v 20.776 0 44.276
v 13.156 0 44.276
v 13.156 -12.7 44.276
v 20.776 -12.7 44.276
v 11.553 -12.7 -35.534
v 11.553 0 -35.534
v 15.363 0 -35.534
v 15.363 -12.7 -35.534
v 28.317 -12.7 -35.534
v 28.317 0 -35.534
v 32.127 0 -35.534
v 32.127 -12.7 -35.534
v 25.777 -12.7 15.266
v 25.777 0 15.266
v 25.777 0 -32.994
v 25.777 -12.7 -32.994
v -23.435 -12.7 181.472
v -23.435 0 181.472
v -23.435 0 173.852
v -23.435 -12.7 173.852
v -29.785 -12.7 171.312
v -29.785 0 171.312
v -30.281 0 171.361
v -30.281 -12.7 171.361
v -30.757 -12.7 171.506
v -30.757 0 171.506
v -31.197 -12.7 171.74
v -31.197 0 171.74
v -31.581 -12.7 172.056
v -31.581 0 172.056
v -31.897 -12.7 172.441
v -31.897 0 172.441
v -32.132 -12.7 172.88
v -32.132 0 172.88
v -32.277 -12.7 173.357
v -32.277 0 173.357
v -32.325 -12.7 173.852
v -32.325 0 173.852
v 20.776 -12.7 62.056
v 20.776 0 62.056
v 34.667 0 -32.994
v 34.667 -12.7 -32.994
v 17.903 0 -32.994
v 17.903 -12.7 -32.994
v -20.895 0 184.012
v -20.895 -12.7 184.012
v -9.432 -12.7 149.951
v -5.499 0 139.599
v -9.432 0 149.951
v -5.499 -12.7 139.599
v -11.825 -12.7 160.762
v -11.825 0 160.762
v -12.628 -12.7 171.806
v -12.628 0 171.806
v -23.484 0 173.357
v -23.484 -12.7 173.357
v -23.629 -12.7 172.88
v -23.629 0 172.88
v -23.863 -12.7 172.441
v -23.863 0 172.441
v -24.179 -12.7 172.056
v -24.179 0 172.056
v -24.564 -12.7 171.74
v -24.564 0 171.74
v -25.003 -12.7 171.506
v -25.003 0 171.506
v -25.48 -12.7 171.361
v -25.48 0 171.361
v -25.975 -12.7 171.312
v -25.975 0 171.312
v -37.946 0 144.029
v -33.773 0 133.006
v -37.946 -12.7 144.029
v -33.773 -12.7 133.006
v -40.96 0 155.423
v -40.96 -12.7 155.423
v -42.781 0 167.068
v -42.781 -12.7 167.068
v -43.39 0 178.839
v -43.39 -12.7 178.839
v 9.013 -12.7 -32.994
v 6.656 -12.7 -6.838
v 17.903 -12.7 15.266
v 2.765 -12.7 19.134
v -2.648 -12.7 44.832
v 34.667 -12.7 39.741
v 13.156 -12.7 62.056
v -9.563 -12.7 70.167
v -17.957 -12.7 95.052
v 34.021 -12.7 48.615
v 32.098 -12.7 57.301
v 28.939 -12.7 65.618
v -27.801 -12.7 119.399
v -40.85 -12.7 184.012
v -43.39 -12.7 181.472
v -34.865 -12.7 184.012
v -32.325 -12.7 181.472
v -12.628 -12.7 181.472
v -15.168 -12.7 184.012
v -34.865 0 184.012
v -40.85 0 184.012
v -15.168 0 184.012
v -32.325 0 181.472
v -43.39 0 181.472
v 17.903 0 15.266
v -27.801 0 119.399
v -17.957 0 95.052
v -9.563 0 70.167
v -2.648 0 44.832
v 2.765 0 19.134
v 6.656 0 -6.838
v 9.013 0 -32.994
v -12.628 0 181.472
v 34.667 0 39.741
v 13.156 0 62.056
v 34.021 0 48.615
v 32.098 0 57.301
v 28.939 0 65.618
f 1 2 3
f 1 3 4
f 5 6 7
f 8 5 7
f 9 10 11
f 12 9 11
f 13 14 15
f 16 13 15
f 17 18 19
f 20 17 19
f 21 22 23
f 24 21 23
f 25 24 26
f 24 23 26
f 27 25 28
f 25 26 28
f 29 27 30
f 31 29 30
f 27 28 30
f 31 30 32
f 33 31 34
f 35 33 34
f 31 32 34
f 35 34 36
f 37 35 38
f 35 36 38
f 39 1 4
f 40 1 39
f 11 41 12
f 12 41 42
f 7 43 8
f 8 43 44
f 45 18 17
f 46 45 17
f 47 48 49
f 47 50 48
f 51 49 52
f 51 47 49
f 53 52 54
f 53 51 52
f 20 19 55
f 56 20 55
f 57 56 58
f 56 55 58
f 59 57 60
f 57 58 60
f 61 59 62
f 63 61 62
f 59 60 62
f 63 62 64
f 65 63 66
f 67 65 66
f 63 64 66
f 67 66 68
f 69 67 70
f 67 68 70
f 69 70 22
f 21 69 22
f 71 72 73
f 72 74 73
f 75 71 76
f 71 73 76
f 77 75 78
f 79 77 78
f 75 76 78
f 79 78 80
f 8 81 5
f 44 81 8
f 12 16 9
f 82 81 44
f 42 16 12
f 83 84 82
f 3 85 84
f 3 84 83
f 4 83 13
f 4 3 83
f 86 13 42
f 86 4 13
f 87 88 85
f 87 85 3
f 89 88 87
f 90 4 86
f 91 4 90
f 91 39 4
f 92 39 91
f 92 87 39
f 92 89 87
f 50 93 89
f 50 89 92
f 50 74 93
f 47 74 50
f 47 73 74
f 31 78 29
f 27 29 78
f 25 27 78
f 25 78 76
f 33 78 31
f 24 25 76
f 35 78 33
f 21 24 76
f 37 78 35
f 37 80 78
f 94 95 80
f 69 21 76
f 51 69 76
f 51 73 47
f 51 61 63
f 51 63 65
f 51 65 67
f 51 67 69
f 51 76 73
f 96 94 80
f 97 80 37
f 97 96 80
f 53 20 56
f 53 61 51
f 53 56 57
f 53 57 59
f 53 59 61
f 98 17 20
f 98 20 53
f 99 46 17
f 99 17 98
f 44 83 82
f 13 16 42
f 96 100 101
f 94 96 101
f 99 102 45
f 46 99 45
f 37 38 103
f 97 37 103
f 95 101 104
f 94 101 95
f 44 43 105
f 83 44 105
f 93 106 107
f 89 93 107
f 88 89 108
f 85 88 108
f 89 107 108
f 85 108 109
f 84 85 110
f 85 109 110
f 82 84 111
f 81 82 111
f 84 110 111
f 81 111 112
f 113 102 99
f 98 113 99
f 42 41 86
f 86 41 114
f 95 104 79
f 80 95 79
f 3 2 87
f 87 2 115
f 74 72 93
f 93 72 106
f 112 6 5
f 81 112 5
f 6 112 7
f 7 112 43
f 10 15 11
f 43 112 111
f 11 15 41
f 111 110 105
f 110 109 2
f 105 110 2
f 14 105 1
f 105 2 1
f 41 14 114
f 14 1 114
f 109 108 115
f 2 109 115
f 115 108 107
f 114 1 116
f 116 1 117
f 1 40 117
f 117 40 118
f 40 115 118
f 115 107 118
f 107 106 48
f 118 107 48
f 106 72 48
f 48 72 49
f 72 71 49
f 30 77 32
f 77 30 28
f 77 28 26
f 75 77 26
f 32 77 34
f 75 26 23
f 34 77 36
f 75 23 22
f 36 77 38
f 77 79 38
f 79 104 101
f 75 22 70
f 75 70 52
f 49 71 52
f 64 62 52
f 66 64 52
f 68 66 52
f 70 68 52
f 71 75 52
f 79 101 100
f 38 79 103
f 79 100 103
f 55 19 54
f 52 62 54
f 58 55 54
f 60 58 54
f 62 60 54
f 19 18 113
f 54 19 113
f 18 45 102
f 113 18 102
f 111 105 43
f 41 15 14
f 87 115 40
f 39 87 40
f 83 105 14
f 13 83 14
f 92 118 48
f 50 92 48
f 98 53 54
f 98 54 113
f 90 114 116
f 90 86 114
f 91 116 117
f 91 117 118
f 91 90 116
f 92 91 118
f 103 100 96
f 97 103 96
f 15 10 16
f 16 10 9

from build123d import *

# Parameters (mm, degrees)
F0_W        = 7.62
F0_H        = 17.78
F1_DEPTH    = 12.7
F2_SIZE     = 2.54
F3_R        = 61.3177298103
F4_R        = 76.3155057079
F5_R        = 114.0325409017
F6_T1_DEPTH = 12.7


# Not quite as in the source:
# - a fillet or chamfer that OpenCascade refuses, or shapes differently, is made with other operations: its cross-section is extruded or revolved along the edge and cut away or added


with BuildPart() as f1:
    # F0 (on Front) → F1 (new body)
    with BuildSketch(Plane.XZ):
        with BuildLine():
            Line((-43.3897525072, 184.0122990829), (-43.3897525072, 154.9135648233))
            Line((-43.3897525072, 154.9135648233), (-12.6282460988, 154.9135648233))
            Line((-12.6282460988, 154.9135648233), (-12.6282460988, 184.0122990829))
            Line((-12.6282460988, 184.0122990829), (-23.4354074901, 184.0122990829))
            Line((-23.4354074901, 184.0122990829), (-23.4354074901, 173.8522990829))
            ThreePointArc((-23.4354074901, 173.8522990829), (-24.1793562659, 172.0562478587), (-25.9754074901, 171.3122990829))
            Line((-25.9754074901, 171.3122990829), (-29.7854074901, 171.3122990829))
            ThreePointArc((-29.7854074901, 171.3122990829), (-31.5814587143, 172.0562478587), (-32.3254074901, 173.8522990829))
            Line((-32.3254074901, 173.8522990829), (-32.3254074901, 184.0122990829))
            Line((-32.3254074901, 184.0122990829), (-43.3897525072, 184.0122990829))
        make_face()
        Polygon((-43.3897525072, 154.9135648233), (9.0125808752, 35.5335648233), (34.6665808752, 35.5335648233), (34.6665808752, 53.3135648233), (-12.6282460988, 154.9135648233), align=None)
        with Locations((16.9659831101, 53.1658351564)):
            Rectangle(F0_W, F0_H, mode=Mode.SUBTRACT)
        Polygon((34.6665808752, 35.5335648233), (9.0125808752, 35.5335648233), (9.0125808752, -35.5335648233), (17.9025808752, -35.5335648233), (17.9025808752, 15.2664351767), (25.7765808752, 15.2664351767), (25.7765808752, -35.5335648233), (34.6665808752, -35.5335648233), align=None)
    extrude(amount=F1_DEPTH)

    # F2
    f2_edges = [f1.edges().sort_by_distance(p)[0] for p in [
        (-32.325407, -6.35, 184.012299),
        (-23.435407, -6.35, 184.012299),
        (-12.628246, -6.35, 184.012299),
        (-43.389753, -6.35, 184.012299),
        (17.902581, -6.35, -35.533565),
        (25.776581, -6.35, -35.533565),
        (34.666581, -6.35, -35.533565),
        (9.012581, -6.35, -35.533565),
    ]]
    chamfer(f2_edges, length=F2_SIZE)

    # F3
    f3_edges = [f1.edges().sort_by_distance(p)[0] for p in [
        (34.666581, -6.35, 53.313565),
    ]]
    fillet(f3_edges, radius=F3_R)

    # F4
    f4_edges = [f1.edges().sort_by_distance(p)[0] for p in [
        (-12.628246, -6.35, 154.913565),
    ]]
    fillet(f4_edges, radius=F4_R)

    # F5
    f5_edges = [f1.edges().sort_by_distance(p)[0] for p in [
        (-43.389753, -6.35, 154.913565),
    ]]
    fillet(f5_edges, radius=F5_R)

    # F6: fillet of radius 446.1798259809 on 1 edges, made by hand

    # F6_s2 → F6_t1 (join)
    with BuildSketch(Plane.XZ):
        with BuildLine():
            ThreePointArc((-27.8005344067, 119.3990994032), (-2.6481597508, 44.8323374579), (9.0125808752, -32.9935648233))
            Line((9.0125808752, -32.9935648233), (9.0125808752, 35.5335648233))
            Line((9.0125808752, 35.5335648233), (-27.8005344067, 119.3990994032))
        make_face()
    extrude(amount=F6_T1_DEPTH)


solid = f1.part
